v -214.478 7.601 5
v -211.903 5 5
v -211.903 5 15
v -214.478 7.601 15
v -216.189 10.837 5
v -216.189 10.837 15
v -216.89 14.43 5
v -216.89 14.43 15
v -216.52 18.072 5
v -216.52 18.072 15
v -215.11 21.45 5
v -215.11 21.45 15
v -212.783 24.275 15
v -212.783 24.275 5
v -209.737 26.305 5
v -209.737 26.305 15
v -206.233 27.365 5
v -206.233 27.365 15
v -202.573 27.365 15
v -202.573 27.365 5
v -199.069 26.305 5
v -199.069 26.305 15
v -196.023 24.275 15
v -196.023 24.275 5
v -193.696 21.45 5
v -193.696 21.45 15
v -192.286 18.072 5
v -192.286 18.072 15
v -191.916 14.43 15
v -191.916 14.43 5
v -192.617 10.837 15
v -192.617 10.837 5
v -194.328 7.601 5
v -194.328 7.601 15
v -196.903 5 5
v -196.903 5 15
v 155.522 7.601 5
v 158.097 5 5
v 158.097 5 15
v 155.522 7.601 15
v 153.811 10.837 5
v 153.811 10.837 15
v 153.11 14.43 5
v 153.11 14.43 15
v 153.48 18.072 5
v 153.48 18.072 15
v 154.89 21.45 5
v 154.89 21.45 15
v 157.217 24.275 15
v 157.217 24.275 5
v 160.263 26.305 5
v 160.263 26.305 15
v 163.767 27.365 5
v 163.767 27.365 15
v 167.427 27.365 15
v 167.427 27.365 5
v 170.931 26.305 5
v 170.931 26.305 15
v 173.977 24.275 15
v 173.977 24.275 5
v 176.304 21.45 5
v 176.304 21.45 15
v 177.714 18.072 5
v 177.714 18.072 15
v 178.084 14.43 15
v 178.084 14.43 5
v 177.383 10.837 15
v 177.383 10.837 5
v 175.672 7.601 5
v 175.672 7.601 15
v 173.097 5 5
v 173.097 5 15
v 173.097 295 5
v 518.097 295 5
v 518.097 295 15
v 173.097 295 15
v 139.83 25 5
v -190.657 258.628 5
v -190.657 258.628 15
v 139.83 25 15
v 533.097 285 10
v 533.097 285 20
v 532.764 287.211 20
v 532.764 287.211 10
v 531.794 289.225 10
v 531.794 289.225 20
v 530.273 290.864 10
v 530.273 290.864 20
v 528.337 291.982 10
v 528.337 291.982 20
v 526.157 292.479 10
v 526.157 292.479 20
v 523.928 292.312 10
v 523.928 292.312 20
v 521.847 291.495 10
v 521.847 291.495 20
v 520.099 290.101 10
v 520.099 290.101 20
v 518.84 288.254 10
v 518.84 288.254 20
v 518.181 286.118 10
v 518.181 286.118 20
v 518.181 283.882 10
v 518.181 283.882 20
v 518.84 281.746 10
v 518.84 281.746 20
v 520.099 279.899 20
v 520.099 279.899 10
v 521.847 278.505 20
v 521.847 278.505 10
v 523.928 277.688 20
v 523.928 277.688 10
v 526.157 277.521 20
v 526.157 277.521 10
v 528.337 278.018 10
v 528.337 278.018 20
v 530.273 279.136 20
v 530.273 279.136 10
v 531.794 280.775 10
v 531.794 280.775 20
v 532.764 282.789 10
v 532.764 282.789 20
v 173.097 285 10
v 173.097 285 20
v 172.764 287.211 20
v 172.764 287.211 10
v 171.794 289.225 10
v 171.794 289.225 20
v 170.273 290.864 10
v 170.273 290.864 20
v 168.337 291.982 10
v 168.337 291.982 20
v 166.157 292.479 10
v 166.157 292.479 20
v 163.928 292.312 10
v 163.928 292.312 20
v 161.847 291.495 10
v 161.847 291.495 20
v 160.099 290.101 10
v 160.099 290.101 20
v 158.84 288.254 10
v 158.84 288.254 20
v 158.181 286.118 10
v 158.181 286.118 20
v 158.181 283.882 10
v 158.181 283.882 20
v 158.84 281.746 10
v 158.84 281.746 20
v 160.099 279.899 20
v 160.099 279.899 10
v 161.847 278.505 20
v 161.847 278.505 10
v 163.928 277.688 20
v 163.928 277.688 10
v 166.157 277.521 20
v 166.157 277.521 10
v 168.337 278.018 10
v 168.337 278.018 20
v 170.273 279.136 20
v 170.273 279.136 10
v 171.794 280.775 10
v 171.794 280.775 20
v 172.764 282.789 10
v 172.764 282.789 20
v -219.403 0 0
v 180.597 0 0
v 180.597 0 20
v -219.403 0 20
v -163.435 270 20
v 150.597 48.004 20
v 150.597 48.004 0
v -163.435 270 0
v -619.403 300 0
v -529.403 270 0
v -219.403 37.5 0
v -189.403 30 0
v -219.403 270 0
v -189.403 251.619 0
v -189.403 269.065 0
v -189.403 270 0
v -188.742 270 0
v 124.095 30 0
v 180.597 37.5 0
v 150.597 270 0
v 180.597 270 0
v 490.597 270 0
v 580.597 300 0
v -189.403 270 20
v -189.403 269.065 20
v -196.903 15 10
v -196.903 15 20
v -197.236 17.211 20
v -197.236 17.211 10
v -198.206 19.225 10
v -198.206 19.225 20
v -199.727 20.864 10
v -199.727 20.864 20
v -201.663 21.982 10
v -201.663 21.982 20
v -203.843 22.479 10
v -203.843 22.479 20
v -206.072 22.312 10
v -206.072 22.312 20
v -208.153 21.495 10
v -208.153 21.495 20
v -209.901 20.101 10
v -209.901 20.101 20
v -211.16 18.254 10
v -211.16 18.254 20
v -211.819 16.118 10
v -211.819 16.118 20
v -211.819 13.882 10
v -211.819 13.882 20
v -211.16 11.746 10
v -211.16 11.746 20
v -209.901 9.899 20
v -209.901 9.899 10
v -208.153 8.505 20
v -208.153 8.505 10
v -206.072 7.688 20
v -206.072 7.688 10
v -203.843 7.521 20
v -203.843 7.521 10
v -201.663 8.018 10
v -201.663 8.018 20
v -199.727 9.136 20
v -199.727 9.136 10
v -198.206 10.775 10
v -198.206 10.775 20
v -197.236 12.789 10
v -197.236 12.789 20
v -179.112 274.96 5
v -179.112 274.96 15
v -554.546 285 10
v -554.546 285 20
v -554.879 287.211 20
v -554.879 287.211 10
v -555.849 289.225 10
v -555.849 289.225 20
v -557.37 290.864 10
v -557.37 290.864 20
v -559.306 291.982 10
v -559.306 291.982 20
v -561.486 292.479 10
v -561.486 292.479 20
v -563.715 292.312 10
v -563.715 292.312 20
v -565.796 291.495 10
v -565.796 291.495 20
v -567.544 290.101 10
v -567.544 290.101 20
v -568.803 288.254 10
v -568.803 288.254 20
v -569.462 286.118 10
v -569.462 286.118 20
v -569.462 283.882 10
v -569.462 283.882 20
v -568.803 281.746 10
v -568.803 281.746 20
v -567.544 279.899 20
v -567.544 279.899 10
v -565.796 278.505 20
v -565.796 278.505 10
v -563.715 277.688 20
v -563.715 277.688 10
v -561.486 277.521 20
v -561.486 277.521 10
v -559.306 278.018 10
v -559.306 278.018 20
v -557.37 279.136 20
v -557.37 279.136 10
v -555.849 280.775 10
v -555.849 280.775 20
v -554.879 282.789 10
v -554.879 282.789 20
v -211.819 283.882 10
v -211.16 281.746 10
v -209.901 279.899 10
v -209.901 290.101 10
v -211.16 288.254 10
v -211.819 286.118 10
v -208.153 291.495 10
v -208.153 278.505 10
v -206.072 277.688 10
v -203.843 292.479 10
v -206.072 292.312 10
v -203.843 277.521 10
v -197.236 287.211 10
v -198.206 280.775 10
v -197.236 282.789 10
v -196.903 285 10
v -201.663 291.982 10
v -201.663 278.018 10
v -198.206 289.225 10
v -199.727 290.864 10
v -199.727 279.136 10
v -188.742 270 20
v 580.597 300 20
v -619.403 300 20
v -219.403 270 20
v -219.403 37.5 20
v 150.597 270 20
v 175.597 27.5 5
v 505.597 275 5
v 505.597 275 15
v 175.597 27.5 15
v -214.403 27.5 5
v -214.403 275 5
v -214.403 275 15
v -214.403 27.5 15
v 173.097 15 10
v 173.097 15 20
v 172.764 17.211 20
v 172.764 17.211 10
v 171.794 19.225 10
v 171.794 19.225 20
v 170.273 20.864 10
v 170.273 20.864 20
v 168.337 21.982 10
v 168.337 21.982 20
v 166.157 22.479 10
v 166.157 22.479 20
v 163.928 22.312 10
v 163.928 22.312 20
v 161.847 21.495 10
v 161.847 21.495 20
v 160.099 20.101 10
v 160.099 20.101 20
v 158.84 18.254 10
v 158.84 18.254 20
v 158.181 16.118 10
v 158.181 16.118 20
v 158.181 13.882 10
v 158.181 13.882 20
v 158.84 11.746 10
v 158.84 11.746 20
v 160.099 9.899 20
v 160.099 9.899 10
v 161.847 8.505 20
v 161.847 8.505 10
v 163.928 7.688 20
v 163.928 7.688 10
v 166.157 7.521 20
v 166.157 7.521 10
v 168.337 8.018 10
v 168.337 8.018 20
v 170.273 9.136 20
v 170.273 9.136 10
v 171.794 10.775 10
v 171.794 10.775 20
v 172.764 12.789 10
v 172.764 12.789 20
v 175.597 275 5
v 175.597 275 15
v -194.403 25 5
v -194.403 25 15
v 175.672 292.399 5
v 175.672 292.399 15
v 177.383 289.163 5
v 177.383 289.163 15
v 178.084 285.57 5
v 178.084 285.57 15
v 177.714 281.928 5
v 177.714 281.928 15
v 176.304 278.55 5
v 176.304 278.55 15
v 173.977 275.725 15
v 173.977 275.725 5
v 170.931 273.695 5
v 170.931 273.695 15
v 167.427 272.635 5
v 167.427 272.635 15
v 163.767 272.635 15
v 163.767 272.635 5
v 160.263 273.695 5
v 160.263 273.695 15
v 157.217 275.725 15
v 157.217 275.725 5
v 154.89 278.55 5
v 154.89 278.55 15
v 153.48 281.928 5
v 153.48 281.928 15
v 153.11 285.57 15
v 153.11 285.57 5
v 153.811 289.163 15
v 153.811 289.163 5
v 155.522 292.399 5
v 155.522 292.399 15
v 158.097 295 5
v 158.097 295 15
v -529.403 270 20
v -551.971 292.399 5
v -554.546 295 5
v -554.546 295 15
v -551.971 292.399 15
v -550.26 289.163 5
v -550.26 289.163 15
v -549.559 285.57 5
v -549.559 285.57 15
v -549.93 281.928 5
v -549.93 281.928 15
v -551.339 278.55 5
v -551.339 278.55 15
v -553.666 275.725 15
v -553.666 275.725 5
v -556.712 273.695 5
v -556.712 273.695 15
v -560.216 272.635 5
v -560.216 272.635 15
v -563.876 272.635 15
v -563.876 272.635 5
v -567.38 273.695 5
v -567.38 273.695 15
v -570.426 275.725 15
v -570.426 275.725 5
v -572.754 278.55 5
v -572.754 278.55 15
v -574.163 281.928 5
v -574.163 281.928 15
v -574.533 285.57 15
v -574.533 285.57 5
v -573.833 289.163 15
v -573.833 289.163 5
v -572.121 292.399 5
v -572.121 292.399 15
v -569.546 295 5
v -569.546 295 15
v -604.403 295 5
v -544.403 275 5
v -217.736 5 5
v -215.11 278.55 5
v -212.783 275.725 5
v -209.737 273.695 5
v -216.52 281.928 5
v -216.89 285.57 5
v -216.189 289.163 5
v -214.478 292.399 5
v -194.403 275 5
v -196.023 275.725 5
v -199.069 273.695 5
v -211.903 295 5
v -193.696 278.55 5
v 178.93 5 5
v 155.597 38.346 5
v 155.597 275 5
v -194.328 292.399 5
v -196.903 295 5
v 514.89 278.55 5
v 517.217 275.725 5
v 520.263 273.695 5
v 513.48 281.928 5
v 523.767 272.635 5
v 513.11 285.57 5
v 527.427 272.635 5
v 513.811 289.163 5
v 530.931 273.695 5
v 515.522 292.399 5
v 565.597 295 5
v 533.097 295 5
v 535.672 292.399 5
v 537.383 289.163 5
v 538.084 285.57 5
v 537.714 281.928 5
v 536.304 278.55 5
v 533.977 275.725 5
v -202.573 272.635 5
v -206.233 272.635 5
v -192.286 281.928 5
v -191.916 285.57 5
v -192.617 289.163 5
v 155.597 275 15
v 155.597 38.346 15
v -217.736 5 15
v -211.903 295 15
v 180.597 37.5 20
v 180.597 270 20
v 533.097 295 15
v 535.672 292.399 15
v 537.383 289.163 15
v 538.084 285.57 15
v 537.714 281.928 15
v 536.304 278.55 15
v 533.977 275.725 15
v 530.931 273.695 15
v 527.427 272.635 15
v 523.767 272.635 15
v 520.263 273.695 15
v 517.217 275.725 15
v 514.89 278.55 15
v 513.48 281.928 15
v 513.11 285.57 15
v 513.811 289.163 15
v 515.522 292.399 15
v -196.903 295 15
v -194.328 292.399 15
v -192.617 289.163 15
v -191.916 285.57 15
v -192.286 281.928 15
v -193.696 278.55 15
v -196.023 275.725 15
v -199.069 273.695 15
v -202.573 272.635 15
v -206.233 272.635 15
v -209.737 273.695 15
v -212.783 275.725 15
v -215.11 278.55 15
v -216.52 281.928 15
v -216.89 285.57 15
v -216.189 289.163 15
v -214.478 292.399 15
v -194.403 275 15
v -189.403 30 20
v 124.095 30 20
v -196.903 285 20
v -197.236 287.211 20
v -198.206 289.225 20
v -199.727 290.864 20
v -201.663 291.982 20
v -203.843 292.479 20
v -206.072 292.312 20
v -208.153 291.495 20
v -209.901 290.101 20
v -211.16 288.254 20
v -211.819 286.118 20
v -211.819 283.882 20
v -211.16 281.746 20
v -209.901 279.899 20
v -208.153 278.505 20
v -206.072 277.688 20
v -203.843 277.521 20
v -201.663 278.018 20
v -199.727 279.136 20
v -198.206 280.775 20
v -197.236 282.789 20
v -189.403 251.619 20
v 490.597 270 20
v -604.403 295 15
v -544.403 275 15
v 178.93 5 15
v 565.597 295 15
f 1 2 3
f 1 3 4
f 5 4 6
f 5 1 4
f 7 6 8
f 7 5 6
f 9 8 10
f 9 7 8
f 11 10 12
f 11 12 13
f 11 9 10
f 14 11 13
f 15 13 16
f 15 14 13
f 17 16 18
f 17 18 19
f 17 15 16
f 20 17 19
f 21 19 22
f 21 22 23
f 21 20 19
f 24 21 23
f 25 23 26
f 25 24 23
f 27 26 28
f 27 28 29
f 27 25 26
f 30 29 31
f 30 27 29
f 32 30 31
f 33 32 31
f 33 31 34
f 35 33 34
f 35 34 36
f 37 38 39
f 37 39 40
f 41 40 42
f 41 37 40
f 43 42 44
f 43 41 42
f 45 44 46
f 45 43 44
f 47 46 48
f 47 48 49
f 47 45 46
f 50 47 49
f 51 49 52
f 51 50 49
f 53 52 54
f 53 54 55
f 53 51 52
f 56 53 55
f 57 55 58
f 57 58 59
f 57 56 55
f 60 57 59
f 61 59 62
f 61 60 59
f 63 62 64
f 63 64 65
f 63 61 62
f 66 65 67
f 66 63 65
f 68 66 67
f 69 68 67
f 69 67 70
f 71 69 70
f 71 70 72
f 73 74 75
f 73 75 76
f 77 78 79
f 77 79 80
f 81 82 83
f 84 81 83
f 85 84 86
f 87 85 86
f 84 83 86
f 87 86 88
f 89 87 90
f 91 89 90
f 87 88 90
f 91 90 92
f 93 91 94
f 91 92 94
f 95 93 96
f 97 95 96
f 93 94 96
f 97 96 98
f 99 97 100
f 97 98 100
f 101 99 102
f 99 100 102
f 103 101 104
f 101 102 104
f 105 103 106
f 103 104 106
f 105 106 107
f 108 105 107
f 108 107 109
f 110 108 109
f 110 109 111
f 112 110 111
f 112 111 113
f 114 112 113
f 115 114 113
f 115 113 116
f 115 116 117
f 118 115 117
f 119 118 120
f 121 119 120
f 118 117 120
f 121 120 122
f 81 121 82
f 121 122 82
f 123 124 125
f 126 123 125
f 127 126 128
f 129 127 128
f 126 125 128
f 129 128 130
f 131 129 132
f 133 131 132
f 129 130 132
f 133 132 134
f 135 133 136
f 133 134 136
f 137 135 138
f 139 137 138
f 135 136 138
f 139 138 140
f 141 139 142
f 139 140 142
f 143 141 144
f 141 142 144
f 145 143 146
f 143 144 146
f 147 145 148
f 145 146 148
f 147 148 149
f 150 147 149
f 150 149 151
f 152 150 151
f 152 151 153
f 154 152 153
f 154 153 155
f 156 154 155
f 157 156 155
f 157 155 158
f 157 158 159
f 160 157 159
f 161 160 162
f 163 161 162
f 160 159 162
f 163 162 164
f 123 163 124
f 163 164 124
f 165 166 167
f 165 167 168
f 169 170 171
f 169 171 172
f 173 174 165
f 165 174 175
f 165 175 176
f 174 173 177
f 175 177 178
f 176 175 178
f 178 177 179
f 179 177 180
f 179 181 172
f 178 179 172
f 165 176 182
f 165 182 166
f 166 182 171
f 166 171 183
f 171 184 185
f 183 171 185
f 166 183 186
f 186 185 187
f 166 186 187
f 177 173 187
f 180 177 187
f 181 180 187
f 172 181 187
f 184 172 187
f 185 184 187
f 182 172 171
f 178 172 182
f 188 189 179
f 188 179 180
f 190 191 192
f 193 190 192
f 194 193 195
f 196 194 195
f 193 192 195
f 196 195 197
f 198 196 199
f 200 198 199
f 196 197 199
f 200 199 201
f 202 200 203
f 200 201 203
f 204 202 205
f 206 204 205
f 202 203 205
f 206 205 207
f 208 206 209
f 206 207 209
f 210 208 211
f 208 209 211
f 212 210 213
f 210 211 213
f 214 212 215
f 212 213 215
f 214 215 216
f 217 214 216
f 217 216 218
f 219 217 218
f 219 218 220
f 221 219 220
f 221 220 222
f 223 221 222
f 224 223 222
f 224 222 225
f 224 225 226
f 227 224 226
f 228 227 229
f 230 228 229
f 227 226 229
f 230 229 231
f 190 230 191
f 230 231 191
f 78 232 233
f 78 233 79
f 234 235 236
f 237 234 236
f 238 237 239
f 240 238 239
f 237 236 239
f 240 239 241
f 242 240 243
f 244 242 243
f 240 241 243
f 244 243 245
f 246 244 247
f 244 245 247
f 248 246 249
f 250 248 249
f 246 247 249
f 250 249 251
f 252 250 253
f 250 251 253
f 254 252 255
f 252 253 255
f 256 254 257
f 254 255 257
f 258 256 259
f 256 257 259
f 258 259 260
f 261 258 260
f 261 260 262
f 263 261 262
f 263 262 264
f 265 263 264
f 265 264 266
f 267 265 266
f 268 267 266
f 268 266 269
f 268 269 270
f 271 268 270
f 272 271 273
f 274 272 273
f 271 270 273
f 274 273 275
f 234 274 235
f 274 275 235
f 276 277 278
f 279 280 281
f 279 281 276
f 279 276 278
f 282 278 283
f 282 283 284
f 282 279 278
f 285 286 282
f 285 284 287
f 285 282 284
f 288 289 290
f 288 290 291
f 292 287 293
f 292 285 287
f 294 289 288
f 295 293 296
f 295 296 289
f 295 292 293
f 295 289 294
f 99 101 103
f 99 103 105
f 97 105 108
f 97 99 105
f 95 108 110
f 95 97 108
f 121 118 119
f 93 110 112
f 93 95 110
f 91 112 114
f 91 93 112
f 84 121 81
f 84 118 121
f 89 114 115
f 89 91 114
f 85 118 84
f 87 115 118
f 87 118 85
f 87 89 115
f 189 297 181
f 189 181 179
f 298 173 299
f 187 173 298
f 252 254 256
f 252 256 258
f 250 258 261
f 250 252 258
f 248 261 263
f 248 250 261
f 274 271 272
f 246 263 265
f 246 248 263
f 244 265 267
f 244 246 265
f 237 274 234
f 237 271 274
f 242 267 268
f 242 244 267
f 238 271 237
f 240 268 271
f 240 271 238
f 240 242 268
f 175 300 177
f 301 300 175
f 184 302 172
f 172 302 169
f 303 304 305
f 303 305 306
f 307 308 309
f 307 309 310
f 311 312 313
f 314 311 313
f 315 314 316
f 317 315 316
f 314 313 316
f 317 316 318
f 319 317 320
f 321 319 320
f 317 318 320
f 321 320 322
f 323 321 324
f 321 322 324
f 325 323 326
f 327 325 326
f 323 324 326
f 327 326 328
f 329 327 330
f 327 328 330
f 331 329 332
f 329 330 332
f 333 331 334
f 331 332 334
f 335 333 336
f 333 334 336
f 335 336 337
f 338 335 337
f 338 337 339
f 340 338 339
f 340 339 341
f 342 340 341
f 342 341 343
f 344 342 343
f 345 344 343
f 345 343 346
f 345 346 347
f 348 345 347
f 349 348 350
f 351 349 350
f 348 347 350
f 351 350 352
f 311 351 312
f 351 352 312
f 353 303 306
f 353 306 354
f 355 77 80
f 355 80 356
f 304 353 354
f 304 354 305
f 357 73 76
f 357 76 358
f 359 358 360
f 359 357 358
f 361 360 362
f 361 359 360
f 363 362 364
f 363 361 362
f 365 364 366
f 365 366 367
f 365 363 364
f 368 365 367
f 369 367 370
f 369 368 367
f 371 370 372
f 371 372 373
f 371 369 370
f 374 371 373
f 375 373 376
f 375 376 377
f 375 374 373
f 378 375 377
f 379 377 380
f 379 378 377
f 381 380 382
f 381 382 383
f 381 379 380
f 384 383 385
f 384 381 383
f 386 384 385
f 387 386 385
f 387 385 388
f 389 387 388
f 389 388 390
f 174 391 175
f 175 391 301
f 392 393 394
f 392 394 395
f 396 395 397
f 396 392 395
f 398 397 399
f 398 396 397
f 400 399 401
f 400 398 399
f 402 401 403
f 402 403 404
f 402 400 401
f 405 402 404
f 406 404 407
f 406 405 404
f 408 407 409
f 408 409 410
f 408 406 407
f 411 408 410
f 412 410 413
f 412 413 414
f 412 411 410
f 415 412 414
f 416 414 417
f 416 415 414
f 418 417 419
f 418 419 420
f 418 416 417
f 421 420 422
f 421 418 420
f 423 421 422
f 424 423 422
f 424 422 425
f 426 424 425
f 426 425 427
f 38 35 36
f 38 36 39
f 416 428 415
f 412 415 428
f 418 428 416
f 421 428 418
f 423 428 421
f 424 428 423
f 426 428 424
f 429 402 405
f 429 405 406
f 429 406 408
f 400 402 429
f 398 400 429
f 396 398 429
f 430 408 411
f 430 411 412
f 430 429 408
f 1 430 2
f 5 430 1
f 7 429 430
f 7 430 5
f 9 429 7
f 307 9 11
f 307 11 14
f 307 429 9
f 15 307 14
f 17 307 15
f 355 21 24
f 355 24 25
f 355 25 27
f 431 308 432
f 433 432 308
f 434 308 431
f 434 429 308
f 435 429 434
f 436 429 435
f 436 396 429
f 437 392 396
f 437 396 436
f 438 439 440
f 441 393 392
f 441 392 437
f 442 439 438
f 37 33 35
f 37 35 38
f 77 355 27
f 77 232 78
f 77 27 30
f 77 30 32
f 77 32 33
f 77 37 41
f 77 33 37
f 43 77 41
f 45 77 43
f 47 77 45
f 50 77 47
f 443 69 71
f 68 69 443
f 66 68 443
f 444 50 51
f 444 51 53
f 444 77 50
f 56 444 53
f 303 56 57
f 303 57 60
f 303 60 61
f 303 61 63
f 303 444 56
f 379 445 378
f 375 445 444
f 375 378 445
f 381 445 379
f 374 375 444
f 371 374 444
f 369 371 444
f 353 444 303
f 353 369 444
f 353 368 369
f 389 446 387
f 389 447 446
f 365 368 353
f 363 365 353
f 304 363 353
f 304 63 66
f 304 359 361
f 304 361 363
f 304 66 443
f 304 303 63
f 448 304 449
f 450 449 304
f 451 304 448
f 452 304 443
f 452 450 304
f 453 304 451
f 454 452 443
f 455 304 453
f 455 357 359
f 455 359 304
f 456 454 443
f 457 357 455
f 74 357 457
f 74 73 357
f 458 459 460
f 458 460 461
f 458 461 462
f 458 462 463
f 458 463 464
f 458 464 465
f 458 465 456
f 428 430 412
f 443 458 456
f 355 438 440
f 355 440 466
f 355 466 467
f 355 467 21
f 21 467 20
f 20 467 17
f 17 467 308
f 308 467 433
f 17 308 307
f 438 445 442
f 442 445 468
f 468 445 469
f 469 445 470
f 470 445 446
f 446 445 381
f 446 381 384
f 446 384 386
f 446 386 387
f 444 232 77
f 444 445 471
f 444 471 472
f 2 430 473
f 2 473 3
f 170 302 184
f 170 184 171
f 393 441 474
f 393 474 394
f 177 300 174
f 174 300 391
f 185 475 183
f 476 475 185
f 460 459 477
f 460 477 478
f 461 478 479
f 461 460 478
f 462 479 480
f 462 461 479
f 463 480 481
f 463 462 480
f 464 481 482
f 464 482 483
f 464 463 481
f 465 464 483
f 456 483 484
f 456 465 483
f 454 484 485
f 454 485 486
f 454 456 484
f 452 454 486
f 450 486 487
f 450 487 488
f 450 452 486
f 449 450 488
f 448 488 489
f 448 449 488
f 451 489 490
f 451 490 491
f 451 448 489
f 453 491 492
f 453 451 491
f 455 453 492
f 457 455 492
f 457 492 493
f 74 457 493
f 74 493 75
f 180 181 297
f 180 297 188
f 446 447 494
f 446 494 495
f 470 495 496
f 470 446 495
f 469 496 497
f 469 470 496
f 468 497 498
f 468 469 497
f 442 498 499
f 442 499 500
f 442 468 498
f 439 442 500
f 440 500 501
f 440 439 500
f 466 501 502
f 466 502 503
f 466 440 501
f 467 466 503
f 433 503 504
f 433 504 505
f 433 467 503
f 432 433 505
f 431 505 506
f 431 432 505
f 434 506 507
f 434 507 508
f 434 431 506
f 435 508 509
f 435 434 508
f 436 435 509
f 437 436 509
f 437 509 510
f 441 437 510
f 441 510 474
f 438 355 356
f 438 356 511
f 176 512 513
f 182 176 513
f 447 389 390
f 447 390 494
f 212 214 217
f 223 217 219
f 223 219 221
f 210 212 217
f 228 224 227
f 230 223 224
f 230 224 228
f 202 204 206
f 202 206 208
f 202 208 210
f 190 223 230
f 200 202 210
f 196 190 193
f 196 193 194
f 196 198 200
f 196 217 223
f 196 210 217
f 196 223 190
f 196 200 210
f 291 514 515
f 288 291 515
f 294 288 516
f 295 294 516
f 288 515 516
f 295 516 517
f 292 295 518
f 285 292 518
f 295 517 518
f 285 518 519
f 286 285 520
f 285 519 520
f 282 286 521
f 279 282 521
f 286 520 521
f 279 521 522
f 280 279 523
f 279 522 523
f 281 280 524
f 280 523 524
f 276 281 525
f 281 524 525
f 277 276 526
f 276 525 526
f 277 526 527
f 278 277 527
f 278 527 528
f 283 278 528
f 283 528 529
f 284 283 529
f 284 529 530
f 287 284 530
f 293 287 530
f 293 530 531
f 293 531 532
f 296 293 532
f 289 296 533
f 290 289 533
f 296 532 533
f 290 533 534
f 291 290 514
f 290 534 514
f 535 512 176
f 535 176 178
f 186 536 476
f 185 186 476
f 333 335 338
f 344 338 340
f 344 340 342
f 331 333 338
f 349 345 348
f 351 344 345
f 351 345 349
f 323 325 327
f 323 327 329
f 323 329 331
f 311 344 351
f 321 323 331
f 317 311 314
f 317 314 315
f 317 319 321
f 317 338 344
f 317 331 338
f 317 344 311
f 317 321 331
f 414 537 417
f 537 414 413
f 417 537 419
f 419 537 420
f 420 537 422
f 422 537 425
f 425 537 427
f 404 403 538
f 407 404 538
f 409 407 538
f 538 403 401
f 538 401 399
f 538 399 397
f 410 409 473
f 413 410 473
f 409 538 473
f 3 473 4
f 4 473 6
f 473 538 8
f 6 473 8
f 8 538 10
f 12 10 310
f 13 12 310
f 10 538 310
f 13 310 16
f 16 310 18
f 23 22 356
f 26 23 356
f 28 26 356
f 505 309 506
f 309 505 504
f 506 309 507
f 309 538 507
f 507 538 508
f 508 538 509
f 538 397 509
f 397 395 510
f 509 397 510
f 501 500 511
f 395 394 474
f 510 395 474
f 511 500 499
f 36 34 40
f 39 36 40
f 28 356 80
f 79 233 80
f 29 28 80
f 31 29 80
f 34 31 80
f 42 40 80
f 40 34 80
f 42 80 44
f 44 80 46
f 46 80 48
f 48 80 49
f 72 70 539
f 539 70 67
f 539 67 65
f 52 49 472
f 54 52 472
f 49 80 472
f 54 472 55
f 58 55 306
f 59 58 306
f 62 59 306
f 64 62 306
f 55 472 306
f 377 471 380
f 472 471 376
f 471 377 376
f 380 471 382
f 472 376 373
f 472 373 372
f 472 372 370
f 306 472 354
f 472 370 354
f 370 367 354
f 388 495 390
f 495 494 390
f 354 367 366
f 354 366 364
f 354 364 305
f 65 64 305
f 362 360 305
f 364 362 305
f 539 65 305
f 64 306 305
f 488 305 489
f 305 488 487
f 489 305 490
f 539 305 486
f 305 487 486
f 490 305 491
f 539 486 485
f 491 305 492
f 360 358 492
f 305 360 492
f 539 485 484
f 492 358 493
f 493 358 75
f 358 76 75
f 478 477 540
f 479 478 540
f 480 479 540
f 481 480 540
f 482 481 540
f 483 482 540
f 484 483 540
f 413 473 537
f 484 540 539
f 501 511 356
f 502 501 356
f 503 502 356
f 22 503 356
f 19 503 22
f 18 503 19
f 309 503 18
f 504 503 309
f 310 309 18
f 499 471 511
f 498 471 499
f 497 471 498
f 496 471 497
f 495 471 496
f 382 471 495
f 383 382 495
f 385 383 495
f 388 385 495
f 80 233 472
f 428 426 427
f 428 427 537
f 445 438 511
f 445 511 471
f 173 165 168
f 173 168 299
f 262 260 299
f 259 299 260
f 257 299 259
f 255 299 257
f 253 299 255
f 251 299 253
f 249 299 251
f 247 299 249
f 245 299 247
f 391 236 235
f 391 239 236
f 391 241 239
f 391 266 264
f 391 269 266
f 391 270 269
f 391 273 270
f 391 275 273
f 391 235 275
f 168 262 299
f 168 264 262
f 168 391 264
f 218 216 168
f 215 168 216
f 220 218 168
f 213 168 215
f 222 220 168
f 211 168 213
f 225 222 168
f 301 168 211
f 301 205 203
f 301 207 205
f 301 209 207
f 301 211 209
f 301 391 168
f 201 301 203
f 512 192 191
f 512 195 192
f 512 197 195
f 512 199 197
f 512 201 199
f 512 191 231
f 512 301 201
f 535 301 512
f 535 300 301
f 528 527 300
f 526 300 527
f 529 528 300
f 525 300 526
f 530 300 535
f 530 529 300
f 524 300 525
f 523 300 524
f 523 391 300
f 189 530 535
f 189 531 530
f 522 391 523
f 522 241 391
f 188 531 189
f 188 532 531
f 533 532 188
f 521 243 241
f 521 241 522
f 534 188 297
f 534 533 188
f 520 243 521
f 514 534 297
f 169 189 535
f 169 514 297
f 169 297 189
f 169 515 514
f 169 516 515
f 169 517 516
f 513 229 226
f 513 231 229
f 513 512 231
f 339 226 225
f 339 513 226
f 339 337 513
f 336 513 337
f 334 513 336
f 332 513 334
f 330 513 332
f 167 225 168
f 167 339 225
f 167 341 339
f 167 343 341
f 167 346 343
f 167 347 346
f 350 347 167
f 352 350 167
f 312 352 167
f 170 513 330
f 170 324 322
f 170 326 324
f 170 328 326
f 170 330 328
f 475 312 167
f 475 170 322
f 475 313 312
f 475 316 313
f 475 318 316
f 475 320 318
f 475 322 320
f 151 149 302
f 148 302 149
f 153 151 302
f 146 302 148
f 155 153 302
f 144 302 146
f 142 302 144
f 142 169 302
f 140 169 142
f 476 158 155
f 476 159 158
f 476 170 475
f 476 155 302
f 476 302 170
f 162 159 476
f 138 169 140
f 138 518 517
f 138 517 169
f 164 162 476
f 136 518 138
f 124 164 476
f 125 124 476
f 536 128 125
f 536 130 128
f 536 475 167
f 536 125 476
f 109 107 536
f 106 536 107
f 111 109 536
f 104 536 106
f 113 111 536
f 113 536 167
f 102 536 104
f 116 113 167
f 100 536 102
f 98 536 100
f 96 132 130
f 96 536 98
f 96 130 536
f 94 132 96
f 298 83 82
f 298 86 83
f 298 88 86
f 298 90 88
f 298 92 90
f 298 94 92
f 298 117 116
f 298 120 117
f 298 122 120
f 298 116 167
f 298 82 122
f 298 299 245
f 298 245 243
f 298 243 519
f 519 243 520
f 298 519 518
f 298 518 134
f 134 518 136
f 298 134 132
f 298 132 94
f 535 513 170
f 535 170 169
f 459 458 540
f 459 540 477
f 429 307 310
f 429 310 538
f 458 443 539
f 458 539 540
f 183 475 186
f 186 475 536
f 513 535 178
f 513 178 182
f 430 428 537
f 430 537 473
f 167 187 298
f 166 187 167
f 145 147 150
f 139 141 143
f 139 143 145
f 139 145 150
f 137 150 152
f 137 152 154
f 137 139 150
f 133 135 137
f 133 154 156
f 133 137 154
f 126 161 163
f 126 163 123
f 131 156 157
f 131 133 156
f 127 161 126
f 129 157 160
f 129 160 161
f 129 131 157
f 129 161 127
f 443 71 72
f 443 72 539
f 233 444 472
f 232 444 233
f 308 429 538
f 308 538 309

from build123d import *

# Parameters (mm, degrees)
BOSS_EXTRUDE1_DEPTH = 20
CUT_EXTRUDE1_DEPTH  = 20
BOSS_EXTRUDE3_DEPTH = 20
SKETCH6_R           = 7.5
CUT_EXTRUDE3_DEPTH  = 10
SHELL2_START        = 5
SHELL2_DEPTH        = 10


# Read off the part's stored shape, not the designer's step: Shell2
with BuildPart() as part:
    # Sketch2 → Boss-Extrude1 (new body)
    with BuildSketch(Plane.XY):
        Polygon((-219.402985075, 0), (-619.402985075, 300), (580.597014925, 300), (180.597014925, 0), align=None)
    extrude(amount=BOSS_EXTRUDE1_DEPTH)

    # Sketch3 → Cut-Extrude1 (cut)
    with BuildSketch(Plane.XY.offset(20)):
        Polygon((-529.402985075, 270), (-209.402985075, 30), (170.597014925, 30), (490.597014925, 270), align=None)
    extrude(amount=-CUT_EXTRUDE1_DEPTH, mode=Mode.SUBTRACT)

    # Sketch4 → Boss-Extrude3 (add)
    with BuildSketch(Plane.XY.offset(20)):
        Polygon((-219.402985075, 270), (-219.402985075, 37.5), (-219.402985075, 30), (-189.402985075, 30), (-189.402985075, 251.618524964), (-197.626477217, 257.431891774), (-189.402985075, 269.064707185), (-189.402985075, 270), align=None)
        Polygon((-180.308988395, 281.928923858), (-189.402985075, 269.064707185), (-189.402985075, 251.618524964), (141.766056114, 17.507872327), (150.597014925, 30), (150.597014925, 48.004218454), align=None)
        Polygon((-189.402985075, 251.618524964), (-189.402985075, 269.064707185), (-197.626477217, 257.431891774), align=None)
        Polygon((158.892990534, 42.497071205), (150.597014925, 48.004218454), (150.597014925, 30), align=None)
        Polygon((150.597014925, 270), (150.597014925, 48.004218454), (158.892990534, 42.497071205), (150.597014925, 30), (180.597014925, 30), (180.597014925, 37.5), (180.597014925, 270), align=None)
    extrude(amount=-BOSS_EXTRUDE3_DEPTH)

    # Sketch6 → Cut-Extrude3 (cut)
    with BuildSketch(Plane.XY.offset(20)):
        with Locations((-204.402985075, 285)):
            Circle(SKETCH6_R)
        with Locations((-204.402985075, 15)):
            Circle(SKETCH6_R)
        with Locations((165.597014925, 15)):
            Circle(SKETCH6_R)
        with Locations((165.597014925, 285)):
            Circle(SKETCH6_R)
        with Locations((525.597014925, 285)):
            Circle(SKETCH6_R)
        with Locations((-562.046220464, 285)):
            Circle(SKETCH6_R)
    extrude(amount=-CUT_EXTRUDE3_DEPTH, mode=Mode.SUBTRACT)

    # Shell2 outline → Shell2 (cut)
    with BuildSketch(Plane.XY.offset(SHELL2_START)):
        with BuildLine():
            ThreePointArc((-554.546220464, 295), (-562.046220464, 272.5), (-569.546220464, 295))
            Line((-569.546220464, 295), (-604.402985075, 295))
            Line((-604.402985075, 295), (-217.736318408, 5))
            Line((-217.736318408, 5), (-211.902985075, 5))
            ThreePointArc((-211.902985075, 5), (-204.402985075, 27.5), (-196.902985075, 5))
            Line((-196.902985075, 5), (158.097014925, 5))
            ThreePointArc((158.097014925, 5), (165.597014925, 27.5), (173.097014925, 5))
            Line((173.097014925, 5), (178.930348259, 5))
            Line((178.930348259, 5), (565.597014925, 295))
            Line((565.597014925, 295), (533.097014925, 295))
            ThreePointArc((533.097014925, 295), (525.597014925, 272.5), (518.097014925, 295))
            Line((518.097014925, 295), (173.097014925, 295))
            ThreePointArc((173.097014925, 295), (165.597014925, 272.5), (158.097014925, 295))
            Line((158.097014925, 295), (-196.902985075, 295))
            ThreePointArc((-196.902985075, 295), (-204.402985075, 272.5), (-211.902985075, 295))
            Line((-211.902985075, 295), (-554.546220464, 295))
        make_face()
        Polygon((-544.402985075, 275), (-214.402985075, 275), (-214.402985075, 27.5), align=None, mode=Mode.SUBTRACT)
        Polygon((-194.402985075, 275), (155.597014925, 275), (155.597014925, 38.346418141), (-179.112397852, 274.95983704), (-190.657390399, 258.628482317), (139.829580663, 25), (-194.402985075, 25), align=None, mode=Mode.SUBTRACT)
        Polygon((175.597014925, 275), (505.597014925, 275), (175.597014925, 27.5), align=None, mode=Mode.SUBTRACT)
    extrude(amount=SHELL2_DEPTH, mode=Mode.SUBTRACT)


solid = part.part
